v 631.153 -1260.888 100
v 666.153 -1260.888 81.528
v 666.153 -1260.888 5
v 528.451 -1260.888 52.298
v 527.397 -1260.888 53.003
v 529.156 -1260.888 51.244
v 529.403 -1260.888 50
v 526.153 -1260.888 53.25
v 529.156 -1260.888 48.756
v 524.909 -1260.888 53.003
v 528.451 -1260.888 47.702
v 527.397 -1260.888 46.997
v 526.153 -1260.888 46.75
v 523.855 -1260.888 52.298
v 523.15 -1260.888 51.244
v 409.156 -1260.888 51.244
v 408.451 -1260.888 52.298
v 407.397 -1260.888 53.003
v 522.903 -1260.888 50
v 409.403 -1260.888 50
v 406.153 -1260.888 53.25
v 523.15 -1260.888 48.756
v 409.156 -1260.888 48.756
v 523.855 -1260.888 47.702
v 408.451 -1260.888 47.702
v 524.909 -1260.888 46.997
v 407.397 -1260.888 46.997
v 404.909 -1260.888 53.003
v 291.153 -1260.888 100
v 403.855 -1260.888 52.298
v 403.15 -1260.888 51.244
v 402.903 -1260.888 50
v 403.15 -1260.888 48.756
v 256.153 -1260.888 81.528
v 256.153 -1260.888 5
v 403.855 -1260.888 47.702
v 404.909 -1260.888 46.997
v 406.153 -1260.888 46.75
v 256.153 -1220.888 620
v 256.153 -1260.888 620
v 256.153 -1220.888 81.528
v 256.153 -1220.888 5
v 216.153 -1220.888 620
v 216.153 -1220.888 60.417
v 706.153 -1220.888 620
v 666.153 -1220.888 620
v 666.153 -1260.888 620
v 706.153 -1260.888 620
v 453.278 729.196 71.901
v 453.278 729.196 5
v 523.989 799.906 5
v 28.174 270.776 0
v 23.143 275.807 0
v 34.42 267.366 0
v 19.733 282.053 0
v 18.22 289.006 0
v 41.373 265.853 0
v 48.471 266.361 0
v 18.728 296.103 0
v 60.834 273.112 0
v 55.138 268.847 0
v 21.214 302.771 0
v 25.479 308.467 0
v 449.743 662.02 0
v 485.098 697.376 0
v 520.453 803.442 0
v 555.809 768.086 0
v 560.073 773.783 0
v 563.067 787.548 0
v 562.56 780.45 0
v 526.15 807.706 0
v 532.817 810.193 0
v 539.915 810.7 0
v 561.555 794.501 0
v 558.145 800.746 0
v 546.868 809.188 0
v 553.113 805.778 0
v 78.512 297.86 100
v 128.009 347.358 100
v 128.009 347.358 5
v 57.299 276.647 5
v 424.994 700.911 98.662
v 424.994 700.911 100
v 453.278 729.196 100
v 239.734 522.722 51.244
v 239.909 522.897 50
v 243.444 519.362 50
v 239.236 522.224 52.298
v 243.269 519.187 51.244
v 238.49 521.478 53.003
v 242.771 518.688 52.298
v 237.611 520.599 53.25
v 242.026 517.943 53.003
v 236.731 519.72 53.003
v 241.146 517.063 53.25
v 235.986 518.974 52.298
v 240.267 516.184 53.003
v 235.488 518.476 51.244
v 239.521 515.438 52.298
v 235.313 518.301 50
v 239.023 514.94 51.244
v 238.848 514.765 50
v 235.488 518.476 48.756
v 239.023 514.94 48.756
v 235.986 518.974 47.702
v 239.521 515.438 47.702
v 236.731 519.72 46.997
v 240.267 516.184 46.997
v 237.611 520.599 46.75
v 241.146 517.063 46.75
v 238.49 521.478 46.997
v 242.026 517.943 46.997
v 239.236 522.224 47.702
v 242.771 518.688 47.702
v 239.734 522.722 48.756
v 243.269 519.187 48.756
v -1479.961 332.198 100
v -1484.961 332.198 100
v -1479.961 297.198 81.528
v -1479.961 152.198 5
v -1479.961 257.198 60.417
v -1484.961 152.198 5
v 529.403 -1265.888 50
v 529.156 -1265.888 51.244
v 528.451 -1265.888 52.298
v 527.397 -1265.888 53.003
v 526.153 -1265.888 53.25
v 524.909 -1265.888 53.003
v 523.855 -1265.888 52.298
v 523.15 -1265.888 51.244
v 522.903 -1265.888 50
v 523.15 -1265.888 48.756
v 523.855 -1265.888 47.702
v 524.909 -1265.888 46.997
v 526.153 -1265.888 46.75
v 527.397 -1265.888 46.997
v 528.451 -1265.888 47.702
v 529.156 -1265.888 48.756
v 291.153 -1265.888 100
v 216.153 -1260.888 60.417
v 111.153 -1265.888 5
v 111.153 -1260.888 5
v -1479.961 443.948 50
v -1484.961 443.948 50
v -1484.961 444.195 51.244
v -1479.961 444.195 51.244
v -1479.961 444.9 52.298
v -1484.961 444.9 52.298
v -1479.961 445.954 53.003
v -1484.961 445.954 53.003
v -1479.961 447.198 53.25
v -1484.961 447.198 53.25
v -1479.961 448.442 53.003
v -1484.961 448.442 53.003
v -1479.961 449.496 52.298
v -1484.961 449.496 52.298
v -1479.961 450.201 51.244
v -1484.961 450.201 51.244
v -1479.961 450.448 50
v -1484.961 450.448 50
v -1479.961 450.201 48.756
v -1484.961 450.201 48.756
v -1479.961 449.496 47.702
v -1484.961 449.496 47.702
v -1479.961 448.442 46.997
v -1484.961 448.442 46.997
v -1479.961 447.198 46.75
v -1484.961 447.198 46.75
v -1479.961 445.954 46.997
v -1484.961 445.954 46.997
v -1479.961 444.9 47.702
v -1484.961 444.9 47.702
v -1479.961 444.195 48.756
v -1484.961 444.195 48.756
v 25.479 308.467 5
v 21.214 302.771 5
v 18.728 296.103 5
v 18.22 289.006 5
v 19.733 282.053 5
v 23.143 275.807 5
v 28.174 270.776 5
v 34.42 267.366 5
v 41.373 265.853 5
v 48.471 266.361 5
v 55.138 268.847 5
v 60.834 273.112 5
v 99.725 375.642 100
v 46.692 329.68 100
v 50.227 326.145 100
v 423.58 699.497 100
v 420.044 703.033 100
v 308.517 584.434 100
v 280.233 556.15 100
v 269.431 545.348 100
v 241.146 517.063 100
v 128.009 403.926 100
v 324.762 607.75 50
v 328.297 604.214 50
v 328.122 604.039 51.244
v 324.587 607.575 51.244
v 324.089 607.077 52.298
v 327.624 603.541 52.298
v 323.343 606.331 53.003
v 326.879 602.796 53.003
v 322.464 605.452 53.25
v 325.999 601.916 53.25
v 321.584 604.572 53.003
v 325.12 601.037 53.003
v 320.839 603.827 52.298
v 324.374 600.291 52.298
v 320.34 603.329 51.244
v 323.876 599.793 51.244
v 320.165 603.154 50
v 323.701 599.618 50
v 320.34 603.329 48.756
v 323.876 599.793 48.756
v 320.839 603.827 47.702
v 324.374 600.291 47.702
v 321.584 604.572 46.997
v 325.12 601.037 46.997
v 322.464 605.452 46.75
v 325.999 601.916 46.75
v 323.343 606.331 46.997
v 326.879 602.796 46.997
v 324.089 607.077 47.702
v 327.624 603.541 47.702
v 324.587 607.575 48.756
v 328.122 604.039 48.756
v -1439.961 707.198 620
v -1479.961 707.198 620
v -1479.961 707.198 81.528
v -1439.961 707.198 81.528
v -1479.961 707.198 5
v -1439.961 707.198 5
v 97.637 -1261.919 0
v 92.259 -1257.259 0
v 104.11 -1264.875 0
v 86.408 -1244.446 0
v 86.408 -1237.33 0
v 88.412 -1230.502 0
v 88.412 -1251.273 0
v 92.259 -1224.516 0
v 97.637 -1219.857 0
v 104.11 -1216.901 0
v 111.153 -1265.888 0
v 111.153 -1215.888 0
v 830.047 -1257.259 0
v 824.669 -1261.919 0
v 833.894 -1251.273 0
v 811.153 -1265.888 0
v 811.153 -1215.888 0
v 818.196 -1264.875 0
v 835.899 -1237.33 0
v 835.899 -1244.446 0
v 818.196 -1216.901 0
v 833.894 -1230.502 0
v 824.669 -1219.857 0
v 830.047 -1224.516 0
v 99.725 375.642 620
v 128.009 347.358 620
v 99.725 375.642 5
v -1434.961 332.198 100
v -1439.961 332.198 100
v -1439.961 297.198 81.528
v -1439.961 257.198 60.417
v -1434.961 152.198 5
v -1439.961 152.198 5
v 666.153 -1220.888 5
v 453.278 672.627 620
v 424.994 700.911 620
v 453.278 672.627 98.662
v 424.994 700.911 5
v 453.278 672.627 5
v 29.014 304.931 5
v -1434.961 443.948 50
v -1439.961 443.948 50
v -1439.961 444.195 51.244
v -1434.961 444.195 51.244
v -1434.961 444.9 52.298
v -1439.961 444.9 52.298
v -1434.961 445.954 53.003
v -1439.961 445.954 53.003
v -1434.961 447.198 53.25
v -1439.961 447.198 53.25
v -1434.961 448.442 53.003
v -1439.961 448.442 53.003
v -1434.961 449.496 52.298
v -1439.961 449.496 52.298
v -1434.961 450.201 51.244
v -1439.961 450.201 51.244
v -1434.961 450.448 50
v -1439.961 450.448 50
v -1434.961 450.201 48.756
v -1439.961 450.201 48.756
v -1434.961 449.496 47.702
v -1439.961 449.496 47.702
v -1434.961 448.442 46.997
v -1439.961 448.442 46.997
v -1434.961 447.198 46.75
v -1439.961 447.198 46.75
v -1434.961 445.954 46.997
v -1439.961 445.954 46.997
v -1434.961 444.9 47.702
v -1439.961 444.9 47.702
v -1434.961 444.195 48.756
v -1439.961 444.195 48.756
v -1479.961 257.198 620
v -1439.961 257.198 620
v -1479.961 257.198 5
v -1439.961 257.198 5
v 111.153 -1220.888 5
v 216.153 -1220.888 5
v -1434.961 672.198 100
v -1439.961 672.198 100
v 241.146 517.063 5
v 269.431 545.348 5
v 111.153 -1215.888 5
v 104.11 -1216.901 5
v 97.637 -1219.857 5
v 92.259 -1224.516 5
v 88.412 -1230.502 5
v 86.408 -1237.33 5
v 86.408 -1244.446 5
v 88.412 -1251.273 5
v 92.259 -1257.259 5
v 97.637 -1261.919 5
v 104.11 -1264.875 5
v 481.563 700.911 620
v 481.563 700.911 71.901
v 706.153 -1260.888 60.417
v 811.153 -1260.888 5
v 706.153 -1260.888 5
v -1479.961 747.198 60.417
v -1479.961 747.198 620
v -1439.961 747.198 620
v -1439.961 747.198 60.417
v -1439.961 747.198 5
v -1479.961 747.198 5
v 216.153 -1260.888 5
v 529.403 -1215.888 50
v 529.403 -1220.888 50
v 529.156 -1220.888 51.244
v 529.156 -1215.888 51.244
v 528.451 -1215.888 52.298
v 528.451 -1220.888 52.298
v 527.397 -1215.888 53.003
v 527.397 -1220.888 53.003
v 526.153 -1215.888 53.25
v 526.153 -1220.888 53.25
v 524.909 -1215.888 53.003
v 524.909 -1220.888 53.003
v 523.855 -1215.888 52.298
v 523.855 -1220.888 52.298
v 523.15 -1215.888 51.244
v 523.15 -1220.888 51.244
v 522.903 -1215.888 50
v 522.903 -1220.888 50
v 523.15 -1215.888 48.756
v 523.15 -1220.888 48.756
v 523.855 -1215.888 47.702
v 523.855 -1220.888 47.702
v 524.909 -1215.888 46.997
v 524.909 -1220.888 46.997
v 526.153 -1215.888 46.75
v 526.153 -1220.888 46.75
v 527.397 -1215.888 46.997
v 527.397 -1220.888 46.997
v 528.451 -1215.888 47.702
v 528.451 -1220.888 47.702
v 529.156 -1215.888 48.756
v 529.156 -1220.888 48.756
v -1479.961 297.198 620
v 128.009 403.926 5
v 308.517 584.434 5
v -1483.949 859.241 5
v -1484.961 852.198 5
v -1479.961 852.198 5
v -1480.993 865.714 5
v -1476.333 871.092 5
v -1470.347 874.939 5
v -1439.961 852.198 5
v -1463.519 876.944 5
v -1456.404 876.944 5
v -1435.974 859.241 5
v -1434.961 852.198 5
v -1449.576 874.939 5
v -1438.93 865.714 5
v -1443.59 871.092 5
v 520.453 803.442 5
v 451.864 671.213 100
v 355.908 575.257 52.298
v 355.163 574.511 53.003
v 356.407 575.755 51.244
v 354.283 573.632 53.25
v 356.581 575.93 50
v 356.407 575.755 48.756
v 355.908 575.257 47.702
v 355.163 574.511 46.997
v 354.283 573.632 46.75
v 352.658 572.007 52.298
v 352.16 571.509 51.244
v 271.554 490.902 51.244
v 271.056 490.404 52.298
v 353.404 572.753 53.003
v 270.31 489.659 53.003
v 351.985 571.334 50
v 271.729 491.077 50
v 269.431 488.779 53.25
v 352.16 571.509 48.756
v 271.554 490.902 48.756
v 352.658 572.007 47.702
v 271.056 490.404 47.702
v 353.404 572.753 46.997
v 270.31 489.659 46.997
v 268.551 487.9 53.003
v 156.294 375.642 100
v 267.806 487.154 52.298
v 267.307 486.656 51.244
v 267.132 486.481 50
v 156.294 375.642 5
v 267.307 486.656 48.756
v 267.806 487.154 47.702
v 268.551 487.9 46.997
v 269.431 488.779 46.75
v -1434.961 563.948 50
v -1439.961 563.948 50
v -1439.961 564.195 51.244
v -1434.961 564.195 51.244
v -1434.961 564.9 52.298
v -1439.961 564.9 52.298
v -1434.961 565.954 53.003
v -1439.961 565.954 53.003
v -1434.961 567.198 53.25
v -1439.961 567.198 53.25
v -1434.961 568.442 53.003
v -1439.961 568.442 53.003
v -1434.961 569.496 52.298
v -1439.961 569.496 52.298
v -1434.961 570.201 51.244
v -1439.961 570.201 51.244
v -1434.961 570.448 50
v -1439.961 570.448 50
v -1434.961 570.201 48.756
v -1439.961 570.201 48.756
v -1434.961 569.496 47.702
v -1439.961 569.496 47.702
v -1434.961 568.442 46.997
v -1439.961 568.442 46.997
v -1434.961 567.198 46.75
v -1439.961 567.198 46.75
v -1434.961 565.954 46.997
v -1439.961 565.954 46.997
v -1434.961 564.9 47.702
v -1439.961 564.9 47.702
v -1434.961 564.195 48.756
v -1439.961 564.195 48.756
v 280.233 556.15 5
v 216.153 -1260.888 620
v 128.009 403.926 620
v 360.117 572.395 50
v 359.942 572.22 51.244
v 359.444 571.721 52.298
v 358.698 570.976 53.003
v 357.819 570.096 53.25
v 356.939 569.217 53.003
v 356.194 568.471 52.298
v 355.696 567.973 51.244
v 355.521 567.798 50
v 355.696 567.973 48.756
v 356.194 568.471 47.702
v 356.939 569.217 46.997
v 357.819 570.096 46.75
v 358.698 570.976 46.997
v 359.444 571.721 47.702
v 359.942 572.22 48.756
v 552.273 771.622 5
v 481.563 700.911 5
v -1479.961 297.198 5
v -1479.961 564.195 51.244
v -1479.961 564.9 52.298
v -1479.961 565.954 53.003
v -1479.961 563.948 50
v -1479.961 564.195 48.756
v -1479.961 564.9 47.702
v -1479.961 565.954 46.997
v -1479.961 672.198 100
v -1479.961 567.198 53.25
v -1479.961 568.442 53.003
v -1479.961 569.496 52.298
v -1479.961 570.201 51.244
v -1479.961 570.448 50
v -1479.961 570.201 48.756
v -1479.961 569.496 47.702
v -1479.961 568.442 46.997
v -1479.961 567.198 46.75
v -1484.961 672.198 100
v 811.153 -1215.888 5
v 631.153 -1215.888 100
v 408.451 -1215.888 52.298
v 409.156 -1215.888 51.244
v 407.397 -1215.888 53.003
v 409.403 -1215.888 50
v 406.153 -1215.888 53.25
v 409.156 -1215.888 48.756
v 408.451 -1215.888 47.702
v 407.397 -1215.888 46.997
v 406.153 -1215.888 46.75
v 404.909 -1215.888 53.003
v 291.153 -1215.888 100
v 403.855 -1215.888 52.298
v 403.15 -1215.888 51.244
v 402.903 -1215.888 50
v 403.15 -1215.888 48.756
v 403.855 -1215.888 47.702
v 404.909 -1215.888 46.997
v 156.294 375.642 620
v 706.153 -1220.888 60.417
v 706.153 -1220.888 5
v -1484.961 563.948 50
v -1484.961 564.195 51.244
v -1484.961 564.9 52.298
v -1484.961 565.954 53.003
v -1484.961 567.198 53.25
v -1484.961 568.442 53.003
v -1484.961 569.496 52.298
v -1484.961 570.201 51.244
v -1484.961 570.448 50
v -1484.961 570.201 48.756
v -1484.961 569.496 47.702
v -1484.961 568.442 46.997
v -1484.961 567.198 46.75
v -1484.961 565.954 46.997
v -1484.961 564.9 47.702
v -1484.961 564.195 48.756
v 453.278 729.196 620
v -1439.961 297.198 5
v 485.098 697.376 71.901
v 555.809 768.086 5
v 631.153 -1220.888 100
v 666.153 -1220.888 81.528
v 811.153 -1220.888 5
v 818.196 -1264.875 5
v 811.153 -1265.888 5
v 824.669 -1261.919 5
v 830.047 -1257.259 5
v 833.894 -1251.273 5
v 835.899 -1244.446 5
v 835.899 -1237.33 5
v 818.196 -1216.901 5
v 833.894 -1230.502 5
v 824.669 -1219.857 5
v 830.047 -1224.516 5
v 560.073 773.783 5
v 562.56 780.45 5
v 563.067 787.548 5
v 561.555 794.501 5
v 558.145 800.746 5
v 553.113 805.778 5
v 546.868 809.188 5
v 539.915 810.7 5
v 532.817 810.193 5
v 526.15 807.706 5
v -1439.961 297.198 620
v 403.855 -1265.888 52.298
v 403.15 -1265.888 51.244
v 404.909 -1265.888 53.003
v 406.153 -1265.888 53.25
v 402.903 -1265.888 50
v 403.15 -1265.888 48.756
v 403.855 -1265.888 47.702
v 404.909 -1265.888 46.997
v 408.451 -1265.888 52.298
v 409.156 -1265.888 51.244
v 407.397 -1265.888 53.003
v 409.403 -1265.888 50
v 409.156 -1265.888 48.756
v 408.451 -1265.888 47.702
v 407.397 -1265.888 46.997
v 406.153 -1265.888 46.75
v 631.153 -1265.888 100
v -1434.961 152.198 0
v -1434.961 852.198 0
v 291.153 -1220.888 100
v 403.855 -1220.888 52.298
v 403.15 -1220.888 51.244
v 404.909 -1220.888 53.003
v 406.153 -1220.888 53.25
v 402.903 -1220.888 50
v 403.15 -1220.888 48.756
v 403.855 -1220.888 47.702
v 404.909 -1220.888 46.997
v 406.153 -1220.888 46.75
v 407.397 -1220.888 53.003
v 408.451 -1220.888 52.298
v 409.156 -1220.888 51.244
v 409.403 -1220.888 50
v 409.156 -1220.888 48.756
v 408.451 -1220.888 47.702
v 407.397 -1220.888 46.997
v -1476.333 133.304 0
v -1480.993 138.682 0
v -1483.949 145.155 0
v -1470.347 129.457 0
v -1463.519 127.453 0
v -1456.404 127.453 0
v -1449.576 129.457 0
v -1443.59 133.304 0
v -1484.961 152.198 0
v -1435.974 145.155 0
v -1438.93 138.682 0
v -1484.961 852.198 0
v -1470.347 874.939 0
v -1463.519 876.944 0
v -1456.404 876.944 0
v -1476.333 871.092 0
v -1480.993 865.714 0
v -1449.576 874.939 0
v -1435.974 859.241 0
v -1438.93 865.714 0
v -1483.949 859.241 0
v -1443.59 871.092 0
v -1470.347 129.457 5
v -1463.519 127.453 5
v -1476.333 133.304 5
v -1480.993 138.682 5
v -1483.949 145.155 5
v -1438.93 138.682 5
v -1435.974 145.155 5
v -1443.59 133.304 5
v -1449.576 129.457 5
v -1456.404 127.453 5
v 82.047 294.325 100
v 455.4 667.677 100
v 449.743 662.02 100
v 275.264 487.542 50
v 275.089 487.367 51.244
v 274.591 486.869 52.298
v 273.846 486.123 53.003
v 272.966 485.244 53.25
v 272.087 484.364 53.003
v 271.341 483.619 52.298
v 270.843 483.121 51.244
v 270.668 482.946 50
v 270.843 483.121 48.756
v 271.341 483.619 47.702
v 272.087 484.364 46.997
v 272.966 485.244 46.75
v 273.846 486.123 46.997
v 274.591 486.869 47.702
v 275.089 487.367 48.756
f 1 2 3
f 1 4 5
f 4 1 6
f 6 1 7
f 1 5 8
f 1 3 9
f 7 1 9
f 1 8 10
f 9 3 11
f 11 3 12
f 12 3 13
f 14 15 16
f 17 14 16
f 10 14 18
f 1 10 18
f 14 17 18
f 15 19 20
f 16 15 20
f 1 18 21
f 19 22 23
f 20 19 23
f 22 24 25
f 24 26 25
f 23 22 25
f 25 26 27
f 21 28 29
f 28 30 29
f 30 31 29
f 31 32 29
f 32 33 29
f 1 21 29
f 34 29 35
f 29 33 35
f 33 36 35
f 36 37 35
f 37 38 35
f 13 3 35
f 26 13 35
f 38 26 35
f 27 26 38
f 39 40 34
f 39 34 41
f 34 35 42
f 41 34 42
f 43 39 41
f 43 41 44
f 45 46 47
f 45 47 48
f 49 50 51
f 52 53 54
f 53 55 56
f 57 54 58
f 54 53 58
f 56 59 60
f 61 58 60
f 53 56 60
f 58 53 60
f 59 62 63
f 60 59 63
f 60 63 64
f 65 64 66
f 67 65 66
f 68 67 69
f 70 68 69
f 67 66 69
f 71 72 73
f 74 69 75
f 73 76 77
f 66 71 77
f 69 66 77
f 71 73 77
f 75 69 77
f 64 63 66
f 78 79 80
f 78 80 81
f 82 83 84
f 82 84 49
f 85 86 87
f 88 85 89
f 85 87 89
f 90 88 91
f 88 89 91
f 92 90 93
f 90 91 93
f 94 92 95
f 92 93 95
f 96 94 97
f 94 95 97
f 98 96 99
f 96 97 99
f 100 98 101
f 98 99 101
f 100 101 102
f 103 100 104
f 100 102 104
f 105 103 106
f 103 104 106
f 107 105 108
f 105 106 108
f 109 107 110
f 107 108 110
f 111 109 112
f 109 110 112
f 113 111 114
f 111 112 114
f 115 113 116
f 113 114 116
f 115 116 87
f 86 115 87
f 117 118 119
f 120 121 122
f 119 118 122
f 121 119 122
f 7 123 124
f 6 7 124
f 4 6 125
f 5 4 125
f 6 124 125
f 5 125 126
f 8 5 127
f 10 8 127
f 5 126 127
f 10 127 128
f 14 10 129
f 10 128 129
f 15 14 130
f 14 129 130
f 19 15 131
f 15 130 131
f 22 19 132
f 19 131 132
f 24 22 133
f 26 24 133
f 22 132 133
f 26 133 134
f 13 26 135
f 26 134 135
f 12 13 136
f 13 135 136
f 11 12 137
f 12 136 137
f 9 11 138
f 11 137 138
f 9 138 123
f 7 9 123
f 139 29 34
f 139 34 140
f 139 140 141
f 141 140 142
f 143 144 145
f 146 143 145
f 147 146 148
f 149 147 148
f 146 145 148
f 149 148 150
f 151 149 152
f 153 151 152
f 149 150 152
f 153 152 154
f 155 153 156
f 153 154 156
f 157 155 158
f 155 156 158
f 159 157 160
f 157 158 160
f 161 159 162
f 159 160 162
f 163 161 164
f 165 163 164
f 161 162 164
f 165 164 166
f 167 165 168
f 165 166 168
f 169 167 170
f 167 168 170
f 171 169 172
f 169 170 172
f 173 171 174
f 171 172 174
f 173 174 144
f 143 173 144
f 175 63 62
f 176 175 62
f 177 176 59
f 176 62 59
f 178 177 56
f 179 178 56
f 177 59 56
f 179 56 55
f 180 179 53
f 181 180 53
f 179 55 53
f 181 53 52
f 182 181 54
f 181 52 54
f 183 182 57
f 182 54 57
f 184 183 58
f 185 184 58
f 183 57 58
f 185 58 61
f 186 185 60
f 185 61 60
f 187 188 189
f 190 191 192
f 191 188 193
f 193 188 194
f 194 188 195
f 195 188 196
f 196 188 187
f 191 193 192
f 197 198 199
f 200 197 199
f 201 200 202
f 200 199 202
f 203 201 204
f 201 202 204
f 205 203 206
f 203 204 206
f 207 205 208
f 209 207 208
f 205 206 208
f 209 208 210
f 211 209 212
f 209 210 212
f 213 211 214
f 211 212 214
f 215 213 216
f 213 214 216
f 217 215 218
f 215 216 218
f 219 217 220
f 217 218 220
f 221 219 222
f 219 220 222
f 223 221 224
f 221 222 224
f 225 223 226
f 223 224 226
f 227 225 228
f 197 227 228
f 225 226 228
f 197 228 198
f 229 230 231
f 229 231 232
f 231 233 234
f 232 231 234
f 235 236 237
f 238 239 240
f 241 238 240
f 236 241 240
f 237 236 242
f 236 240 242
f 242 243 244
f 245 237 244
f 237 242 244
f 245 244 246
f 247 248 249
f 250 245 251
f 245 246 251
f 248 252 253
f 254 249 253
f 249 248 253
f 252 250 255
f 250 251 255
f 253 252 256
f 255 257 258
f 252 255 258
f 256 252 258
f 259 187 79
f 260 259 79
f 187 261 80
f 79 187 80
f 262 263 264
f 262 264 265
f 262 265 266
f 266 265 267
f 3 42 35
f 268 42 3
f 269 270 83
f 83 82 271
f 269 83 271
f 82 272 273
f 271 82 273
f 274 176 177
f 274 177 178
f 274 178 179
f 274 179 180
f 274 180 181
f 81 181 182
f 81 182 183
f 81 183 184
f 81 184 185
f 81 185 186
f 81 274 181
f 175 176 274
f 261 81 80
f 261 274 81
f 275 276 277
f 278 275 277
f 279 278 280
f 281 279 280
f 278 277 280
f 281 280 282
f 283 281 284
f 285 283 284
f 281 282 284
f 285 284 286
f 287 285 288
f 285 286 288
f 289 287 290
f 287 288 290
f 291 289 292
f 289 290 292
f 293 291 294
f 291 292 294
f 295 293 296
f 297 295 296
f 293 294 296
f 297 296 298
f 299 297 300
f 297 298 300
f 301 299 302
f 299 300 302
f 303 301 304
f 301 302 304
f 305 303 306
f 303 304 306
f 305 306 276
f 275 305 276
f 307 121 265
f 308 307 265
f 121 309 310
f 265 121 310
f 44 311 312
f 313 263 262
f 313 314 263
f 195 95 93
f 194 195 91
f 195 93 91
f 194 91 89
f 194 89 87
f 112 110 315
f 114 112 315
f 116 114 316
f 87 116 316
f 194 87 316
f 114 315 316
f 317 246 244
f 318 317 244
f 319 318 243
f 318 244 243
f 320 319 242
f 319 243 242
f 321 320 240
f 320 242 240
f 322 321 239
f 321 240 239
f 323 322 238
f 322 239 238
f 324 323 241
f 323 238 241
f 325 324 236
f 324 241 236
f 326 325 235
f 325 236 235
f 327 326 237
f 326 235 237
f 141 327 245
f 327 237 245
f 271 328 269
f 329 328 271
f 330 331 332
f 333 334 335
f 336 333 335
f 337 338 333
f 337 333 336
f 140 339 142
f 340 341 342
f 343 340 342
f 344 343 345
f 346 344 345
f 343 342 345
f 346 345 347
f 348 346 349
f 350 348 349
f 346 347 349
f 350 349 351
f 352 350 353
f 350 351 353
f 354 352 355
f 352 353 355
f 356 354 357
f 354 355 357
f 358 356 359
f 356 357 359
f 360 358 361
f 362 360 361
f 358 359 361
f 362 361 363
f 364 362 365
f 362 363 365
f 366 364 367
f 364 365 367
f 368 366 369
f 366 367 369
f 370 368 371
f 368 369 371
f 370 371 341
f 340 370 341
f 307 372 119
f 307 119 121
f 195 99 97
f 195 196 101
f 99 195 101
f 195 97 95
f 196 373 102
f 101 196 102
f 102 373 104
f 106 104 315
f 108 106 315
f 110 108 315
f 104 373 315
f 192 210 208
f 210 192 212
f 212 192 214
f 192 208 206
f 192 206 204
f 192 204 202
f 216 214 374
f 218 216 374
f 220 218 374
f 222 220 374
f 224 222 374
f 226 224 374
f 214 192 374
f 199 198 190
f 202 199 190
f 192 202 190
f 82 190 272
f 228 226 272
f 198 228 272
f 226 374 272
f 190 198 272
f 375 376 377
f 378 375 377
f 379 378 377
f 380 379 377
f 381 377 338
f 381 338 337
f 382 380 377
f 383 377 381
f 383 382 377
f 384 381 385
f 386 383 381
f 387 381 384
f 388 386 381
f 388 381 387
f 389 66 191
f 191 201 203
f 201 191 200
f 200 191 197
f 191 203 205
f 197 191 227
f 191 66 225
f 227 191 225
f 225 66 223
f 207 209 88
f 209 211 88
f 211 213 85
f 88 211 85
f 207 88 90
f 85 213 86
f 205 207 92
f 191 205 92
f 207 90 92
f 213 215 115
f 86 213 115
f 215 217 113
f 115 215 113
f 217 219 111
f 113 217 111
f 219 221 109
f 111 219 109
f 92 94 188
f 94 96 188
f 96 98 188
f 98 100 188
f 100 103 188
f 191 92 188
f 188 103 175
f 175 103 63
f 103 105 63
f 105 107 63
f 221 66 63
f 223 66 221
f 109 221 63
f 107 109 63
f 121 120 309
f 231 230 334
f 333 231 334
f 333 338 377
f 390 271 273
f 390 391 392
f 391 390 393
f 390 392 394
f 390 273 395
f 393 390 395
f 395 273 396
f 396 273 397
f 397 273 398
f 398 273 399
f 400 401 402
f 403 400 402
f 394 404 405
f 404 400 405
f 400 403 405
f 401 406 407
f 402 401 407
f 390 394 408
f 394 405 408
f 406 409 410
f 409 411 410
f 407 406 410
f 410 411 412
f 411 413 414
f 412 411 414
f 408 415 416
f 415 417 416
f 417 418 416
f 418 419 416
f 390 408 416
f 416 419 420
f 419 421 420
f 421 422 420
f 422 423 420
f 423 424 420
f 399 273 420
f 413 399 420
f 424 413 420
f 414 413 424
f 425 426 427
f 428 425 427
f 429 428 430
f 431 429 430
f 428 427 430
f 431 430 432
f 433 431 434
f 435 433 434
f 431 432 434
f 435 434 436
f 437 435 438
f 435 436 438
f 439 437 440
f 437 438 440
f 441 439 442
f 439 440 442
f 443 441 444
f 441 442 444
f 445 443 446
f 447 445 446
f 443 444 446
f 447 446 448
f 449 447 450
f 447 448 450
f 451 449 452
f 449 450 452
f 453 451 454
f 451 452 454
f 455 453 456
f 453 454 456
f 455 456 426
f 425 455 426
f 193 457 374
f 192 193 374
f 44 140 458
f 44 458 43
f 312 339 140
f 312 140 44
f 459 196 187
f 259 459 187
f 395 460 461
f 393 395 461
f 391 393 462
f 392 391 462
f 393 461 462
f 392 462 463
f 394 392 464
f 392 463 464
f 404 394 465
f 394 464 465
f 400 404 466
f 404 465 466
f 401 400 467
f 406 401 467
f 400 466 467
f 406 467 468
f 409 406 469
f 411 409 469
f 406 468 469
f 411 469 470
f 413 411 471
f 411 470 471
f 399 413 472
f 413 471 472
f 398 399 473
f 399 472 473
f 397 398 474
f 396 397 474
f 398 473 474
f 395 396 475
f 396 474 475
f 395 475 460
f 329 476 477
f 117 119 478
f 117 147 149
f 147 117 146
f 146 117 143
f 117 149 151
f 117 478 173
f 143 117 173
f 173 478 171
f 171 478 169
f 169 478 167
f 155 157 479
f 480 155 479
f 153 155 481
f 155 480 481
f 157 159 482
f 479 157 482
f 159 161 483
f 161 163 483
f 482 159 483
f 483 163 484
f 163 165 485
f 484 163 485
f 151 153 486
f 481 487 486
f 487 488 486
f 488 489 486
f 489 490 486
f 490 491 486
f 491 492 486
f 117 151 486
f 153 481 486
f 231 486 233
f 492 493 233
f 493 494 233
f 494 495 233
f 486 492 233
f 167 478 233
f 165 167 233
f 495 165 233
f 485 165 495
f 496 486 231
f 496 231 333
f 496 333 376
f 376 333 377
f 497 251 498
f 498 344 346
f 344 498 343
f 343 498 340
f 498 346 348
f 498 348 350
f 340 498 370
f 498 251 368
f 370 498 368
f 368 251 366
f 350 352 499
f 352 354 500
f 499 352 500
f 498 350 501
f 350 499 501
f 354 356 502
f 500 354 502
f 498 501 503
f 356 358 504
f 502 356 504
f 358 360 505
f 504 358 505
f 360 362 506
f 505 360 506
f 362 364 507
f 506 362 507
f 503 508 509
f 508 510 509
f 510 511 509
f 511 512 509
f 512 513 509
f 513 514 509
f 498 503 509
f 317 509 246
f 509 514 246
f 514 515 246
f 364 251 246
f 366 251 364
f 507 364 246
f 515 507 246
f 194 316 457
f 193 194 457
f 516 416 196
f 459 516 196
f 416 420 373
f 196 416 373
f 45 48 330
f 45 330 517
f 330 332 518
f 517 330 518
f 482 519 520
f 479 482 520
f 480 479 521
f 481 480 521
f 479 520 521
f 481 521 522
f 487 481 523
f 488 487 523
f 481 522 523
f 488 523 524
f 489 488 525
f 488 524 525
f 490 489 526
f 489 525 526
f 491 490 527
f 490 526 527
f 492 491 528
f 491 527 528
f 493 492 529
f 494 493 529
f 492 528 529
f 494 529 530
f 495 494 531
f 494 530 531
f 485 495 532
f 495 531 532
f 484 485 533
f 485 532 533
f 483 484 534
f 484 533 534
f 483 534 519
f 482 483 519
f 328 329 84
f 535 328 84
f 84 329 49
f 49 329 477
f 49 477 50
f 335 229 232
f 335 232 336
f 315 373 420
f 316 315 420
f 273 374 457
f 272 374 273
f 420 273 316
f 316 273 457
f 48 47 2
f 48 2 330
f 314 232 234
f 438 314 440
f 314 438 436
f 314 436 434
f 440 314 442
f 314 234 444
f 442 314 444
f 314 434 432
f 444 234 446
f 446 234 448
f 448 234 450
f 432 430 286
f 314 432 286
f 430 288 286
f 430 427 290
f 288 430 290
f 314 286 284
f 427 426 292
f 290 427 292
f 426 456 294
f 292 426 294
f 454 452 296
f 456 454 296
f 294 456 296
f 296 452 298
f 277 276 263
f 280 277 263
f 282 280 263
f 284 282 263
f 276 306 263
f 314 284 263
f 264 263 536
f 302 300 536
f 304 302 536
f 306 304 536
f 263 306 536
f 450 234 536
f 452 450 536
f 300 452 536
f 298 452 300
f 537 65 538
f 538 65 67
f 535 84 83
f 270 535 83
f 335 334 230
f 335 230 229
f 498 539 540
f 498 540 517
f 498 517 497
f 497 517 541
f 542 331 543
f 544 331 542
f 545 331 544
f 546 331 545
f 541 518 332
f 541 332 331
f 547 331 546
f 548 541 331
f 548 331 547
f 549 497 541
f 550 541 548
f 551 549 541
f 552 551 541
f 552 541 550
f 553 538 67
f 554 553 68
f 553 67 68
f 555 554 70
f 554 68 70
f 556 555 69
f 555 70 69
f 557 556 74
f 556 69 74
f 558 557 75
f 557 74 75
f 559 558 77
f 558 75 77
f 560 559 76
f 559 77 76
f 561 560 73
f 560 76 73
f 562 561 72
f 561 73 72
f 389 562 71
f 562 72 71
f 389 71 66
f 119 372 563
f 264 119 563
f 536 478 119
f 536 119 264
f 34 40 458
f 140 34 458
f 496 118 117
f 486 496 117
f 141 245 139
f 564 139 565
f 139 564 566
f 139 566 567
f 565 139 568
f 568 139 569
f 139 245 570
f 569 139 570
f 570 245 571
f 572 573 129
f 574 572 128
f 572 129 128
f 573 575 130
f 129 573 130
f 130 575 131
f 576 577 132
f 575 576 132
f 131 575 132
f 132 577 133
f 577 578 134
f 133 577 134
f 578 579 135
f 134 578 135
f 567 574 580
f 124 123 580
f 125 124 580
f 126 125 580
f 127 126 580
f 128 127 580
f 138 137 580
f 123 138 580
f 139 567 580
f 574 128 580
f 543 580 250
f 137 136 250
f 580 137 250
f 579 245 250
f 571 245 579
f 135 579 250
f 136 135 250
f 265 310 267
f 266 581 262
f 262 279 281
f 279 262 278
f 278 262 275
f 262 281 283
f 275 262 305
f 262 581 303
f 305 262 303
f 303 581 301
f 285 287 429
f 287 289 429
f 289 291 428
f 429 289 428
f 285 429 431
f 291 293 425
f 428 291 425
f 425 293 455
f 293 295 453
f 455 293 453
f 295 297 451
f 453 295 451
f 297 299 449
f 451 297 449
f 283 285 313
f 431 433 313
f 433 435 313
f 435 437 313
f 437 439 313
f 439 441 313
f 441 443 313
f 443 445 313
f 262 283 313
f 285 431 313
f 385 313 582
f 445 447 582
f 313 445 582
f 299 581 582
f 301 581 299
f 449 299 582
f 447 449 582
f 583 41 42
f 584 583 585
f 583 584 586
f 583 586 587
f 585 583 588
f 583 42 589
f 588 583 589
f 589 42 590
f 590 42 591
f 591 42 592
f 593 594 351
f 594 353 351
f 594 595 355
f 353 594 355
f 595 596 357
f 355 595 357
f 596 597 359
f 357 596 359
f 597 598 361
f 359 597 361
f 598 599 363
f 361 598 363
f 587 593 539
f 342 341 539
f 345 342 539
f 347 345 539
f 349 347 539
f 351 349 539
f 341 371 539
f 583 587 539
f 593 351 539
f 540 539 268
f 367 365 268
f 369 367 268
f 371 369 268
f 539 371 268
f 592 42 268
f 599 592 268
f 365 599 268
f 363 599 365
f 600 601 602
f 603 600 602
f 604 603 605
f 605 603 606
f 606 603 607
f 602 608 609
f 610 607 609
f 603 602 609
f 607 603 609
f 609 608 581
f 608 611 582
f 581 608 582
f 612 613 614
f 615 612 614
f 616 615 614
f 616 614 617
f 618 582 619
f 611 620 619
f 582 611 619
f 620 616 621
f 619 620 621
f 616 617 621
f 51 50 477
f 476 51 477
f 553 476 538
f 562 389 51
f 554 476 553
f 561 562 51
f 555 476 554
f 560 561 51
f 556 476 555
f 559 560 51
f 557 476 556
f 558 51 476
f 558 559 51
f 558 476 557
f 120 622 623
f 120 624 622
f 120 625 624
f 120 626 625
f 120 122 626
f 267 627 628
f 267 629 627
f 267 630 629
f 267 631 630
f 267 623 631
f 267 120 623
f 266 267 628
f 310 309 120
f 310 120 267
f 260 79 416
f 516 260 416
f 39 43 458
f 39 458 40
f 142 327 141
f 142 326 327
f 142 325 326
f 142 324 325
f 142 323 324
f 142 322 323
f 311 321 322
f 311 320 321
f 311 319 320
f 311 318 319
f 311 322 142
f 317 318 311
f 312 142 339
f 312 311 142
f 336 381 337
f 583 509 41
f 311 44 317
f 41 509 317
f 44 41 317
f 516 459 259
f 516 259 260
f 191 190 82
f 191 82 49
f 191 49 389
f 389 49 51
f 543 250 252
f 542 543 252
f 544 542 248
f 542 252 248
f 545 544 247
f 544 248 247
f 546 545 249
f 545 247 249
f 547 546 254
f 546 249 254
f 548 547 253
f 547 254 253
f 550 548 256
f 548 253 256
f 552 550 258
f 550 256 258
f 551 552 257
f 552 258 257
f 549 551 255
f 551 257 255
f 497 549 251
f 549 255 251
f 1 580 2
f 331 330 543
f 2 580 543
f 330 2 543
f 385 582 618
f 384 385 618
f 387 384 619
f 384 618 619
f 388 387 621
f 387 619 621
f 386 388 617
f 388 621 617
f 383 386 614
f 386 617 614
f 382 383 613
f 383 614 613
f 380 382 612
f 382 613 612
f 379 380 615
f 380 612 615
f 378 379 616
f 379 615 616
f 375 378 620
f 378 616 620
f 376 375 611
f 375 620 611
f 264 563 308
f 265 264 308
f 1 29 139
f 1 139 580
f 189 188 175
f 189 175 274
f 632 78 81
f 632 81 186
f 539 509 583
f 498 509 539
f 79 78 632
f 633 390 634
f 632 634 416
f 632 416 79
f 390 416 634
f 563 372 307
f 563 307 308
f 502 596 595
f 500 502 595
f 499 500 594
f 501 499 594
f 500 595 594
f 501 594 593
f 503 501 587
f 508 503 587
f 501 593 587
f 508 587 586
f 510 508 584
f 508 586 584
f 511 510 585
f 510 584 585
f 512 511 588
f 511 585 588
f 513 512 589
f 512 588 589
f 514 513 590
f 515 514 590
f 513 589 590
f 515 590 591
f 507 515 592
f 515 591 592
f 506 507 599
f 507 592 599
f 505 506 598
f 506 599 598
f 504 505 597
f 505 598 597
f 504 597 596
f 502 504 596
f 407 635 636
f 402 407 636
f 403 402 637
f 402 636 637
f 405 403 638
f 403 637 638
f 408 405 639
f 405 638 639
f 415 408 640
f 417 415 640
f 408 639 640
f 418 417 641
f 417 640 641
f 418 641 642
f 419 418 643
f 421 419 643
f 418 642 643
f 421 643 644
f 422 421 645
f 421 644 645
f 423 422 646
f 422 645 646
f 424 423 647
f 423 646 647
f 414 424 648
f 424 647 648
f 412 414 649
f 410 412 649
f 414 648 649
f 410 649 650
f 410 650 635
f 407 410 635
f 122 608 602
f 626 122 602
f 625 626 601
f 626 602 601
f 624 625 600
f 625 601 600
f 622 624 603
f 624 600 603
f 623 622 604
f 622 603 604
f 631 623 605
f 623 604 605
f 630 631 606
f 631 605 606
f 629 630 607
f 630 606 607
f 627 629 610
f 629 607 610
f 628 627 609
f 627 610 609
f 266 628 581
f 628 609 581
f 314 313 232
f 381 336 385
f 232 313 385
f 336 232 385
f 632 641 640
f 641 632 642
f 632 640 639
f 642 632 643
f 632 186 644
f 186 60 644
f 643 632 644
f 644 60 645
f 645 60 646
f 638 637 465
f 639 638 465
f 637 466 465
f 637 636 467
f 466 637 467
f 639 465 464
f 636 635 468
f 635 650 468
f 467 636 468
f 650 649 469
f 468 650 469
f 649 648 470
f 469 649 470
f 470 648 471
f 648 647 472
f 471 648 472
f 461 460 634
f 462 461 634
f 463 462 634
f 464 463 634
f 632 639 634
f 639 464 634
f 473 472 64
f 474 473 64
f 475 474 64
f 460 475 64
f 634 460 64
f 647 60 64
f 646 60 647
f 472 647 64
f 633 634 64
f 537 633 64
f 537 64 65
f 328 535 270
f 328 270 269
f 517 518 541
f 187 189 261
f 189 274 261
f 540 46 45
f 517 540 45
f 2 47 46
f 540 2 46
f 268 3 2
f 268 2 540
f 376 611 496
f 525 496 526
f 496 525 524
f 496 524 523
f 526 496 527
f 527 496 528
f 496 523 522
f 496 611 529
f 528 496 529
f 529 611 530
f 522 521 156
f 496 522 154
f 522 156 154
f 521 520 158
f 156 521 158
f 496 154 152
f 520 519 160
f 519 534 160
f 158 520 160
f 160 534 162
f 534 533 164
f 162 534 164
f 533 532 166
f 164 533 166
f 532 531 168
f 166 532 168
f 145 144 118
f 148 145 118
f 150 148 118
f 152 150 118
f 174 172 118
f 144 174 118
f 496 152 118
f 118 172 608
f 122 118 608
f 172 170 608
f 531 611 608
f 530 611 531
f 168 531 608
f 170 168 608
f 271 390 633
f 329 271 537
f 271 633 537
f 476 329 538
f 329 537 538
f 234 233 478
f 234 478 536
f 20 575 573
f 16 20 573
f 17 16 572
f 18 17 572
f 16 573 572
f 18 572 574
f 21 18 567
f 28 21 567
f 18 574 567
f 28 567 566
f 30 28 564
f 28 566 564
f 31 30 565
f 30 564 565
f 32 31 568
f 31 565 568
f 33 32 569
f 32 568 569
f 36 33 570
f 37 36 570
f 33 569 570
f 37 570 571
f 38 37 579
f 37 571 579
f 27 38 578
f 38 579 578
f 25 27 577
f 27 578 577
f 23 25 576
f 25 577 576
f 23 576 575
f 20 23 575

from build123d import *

# Parameters (mm, degrees)
F0_W           = 105
F0_H           = 40
F1_DEPTH       = 5
F0_W_2         = 40
F0_H_2         = 105
F2_DEPTH       = 620
F3_DEPTH       = 100
F4_T4_DEPTH    = 5
F4_T9_DEPTH    = 5
F4_T14_DEPTH   = 5
F4_T19_DEPTH   = 5
F4_2_T4_DEPTH  = 5
F4_2_T9_DEPTH  = 5
F4_2_T14_DEPTH = 5
F4_2_T19_DEPTH = 5
F6_T4_DEPTH    = 5
F6_T9_DEPTH    = 5
F7_SIZE2       = 94.99999
F7_SIZE        = 29.99999
F7_2_SIZE2     = 94.99999
F7_2_SIZE      = 29.99999
F10_R          = 3.25
F11_DEPTH      = 60
F12_R          = 3.25
F13_DEPTH      = 60
F14_R          = 3.25
F15_DEPTH      = 60


# Not quite as in the source:
# - a fillet or chamfer that OpenCascade refuses, or shapes differently, is made with other operations: its cross-section is extruded or revolved along the edge and cut away or added
# - two fillets or chamfers of one size are made in one step
# - a fillet or chamfer is up to 0.001 mm smaller than in the source, because OpenCascade refuses the exact size
# - a feature names something its author has since deleted; it is built from what else it names


with BuildPart() as f1:
    # F0 (on Top) → F1 (new body)
    with BuildSketch(Plane.XY):
        with BuildLine():
            ThreePointArc((811.153096903, -1265.8878414162), (836.153096903, -1240.8878414162), (811.153096903, -1215.8878414162))
            Line((811.153096903, -1215.8878414162), (811.153096903, -1220.8878414162))
            Line((811.153096903, -1220.8878414162), (811.153096903, -1260.8878414162))
            Line((811.153096903, -1260.8878414162), (811.153096903, -1265.8878414162))
        make_face()
        with Locations((758.653096903, -1240.8878414162)):
            Rectangle(F0_W, F0_H)
    extrude(amount=F1_DEPTH)



with BuildPart() as f1b:
    # F0 (on Top) → F1, piece 2 (new body)
    with BuildSketch(Plane.XY):
        with BuildLine():
            Line((111.153096903, -1220.8878414162), (111.153096903, -1215.8878414162))
            ThreePointArc((111.153096903, -1215.8878414162), (86.153096903, -1240.8878414162), (111.153096903, -1265.8878414162))
            Line((111.153096903, -1265.8878414162), (111.153096903, -1260.8878414162))
            Line((111.153096903, -1260.8878414162), (111.153096903, -1220.8878414162))
        make_face()
        with Locations((163.653096903, -1240.8878414162)):
            Rectangle(F0_W, F0_H)
    extrude(amount=F1_DEPTH)


with BuildPart() as f1c:
    # F0 (on Top) → F1, piece 3 (new body)
    with BuildSketch(Plane.XY):
        with BuildLine():
            Line((29.0142804433, 304.9314484107), (25.4787465374, 308.4669823167))
            ThreePointArc((25.4787465374, 308.4669823167), (25.4787465374, 273.1116432573), (60.8340855967, 273.1116432573))
            Line((60.8340855967, 273.1116432573), (57.2985516908, 276.6471771633))
            Line((57.2985516908, 276.6471771633), (29.0142804433, 304.9314484107))
        make_face()
        Polygon((99.724958562, 375.6421265294), (29.0142804433, 304.9314484107), (57.2985516908, 276.6471771633), (128.0092298094, 347.3578552819), align=None)
    extrude(amount=F1_DEPTH)



with BuildPart() as f1d:
    # F0 (on Top) → F1, piece 4 (new body)
    with BuildSketch(Plane.XY):
        with BuildLine():
            ThreePointArc((555.8088324273, 768.0863900879), (555.8088324273, 803.4417291473), (520.453493368, 803.4417291473))
            Line((520.453493368, 803.4417291473), (523.9890272739, 799.9061952413))
            Line((523.9890272739, 799.9061952413), (552.2732985214, 771.6219239939))
            Line((552.2732985214, 771.6219239939), (555.8088324273, 768.0863900879))
        make_face()
        Polygon((552.2732985214, 771.6219239939), (523.9890272739, 799.9061952413), (453.2783491552, 729.1955171227), (481.5626204027, 700.9112458752), align=None)
    extrude(amount=F1_DEPTH)


with BuildPart() as f1e:
    # F0 (on Top) → F1, piece 5 (new body)
    with BuildSketch(Plane.XY):
        with BuildLine():
            Line((-1479.9614127988, 152.1980424396), (-1484.9614127988, 152.1980424396))
            ThreePointArc((-1484.9614127988, 152.1980424396), (-1459.9614127988, 127.1980424396), (-1434.9614127988, 152.1980424396))
            Line((-1434.9614127988, 152.1980424396), (-1439.9614127988, 152.1980424396))
            Line((-1439.9614127988, 152.1980424396), (-1479.9614127988, 152.1980424396))
        make_face()
        Polygon((-1479.9614127988, 202.1980424396), (-1479.9614127988, 152.1980424396), (-1439.9614127988, 152.1980424396), (-1439.9614127988, 202.1980424396), (-1439.9614127988, 242.1980424396), (-1439.9614127988, 257.1980424396), (-1479.9614127988, 257.1980424396), (-1479.9614127988, 242.1980424396), align=None)
    extrude(amount=F1_DEPTH)



with BuildPart() as f1f:
    # F0 (on Top) → F1, piece 6 (new body)
    with BuildSketch(Plane.XY):
        with BuildLine():
            ThreePointArc((-1434.9614127988, 852.1980424396), (-1459.9614127988, 877.1980424396), (-1484.9614127988, 852.1980424396))
            Line((-1484.9614127988, 852.1980424396), (-1479.9614127988, 852.1980424396))
            Line((-1479.9614127988, 852.1980424396), (-1439.9614127988, 852.1980424396))
            Line((-1439.9614127988, 852.1980424396), (-1434.9614127988, 852.1980424396))
        make_face()
        with Locations((-1459.9614127988, 799.6980424396)):
            Rectangle(F0_W_2, F0_H_2)
    extrude(amount=F1_DEPTH)


with BuildPart() as f1g:
    # F0 (on Top) → F1, piece 7 (new body)
    with BuildSketch(Plane.XY):
        Polygon((331.153096903, -1220.8878414162), (256.153096903, -1220.8878414162), (256.153096903, -1260.8878414162), (331.153096903, -1260.8878414162), (421.153096903, -1260.8878414162), (511.153096903, -1260.8878414162), (591.153096903, -1260.8878414162), (666.153096903, -1260.8878414162), (666.153096903, -1220.8878414162), (591.153096903, -1220.8878414162), (511.153096903, -1220.8878414162), (421.153096903, -1220.8878414162), align=None)
    extrude(amount=F1_DEPTH)


with BuildPart() as f1h:
    # F0 (on Top) → F1, piece 8 (new body)
    with BuildSketch(Plane.XY):
        Polygon((-1439.9614127988, 707.1980424396), (-1479.9614127988, 707.1980424396), (-1479.9614127988, 542.1980424396), (-1479.9614127988, 502.1980424396), (-1479.9614127988, 297.1980424396), (-1439.9614127988, 297.1980424396), (-1439.9614127988, 502.1980424396), (-1439.9614127988, 542.1980424396), align=None)
    extrude(amount=F1_DEPTH)


with BuildPart() as f1i:
    # F0 (on Top) → F1, piece 9 (new body)
    with BuildSketch(Plane.XY):
        Polygon((241.1463147993, 517.0634827667), (128.0092298094, 403.9263977769), (156.2935010569, 375.6421265294), (269.4305860467, 488.7792115192), (297.7148572942, 517.0634827667), (304.7859251061, 524.1345505786), (333.0701963535, 552.418821826), (453.2783491552, 672.6269746277), (424.9940779078, 700.9112458752), (308.516985229, 584.4341531964), (280.2327139815, 556.149881949), (269.4305860467, 545.3477540142), align=None)
    extrude(amount=F1_DEPTH)


with BuildPart() as f1c_1:
    add(f1c.part)

    add(f1d.part)  # F2 merges F1d

    add(f1i.part)  # F2 merges F1i
    # F0 (on Top) → F2 (join)
    with BuildSketch(Plane.XY):
        Polygon((128.0092298094, 403.9263977769), (99.724958562, 375.6421265294), (128.0092298094, 347.3578552819), (156.2935010569, 375.6421265294), align=None)
        Polygon((481.5626204027, 700.9112458752), (453.2783491552, 729.1955171227), (424.9940779078, 700.9112458752), (453.2783491552, 672.6269746277), align=None)
    extrude(amount=F2_DEPTH)

    # F0 (on Top) → F3, piece 2 (join)
    with BuildSketch(Plane.XY):
        Polygon((392.9787465374, 675.9669823167), (43.156416067, 326.1446518463), (25.4787465374, 308.4669823167), (29.0142804433, 304.9314484107), (99.724958562, 375.6421265294), (128.0092298094, 403.9263977769), (241.1463147993, 517.0634827667), (269.4305860467, 545.3477540142), (280.2327139815, 556.149881949), (308.516985229, 584.4341531964), (424.9940779078, 700.9112458752), (453.2783491552, 729.1955171227), (523.9890272739, 799.9061952413), (520.453493368, 803.4417291473), (446.0117551264, 728.9999909057), (414.38747619, 697.3757119693), align=None)
        Polygon((57.2985516908, 276.6471771633), (60.8340855967, 273.1116432573), (78.5117551264, 290.789312787), (428.3340855967, 640.6116432573), (449.7428152493, 662.0203729099), (485.0981543086, 697.3757119693), (555.8088324273, 768.0863900879), (552.2732985214, 771.6219239939), (481.5626204027, 700.9112458752), (453.2783491552, 672.6269746277), (333.0701963535, 552.418821826), (304.7859251061, 524.1345505786), (297.7148572942, 517.0634827667), (269.4305860467, 488.7792115192), (156.2935010569, 375.6421265294), (128.0092298094, 347.3578552819), align=None)
    extrude(amount=F3_DEPTH)

    # F6: chamfer of 142 x 95 on 2 edges, made by hand


with BuildPart() as f1_1:
    add(f1.part)

    add(f1b.part)  # F2#2 merges F1b

    add(f1g.part)  # F2#2 merges F1g
    # F0 (on Top) → F2, piece 2 (join)
    with BuildSketch(Plane.XY):
        with Locations((686.153096903, -1240.8878414162)):
            Rectangle(F0_W_2, F0_H)
        with Locations((236.153096903, -1240.8878414162)):
            Rectangle(F0_W_2, F0_H)
    extrude(amount=F2_DEPTH)

    # F0 (on Top) → F3, piece 3 (join)
    with BuildSketch(Plane.XY):
        Polygon((811.153096903, -1215.8878414162), (111.153096903, -1215.8878414162), (111.153096903, -1220.8878414162), (216.153096903, -1220.8878414162), (256.153096903, -1220.8878414162), (331.153096903, -1220.8878414162), (421.153096903, -1220.8878414162), (511.153096903, -1220.8878414162), (591.153096903, -1220.8878414162), (666.153096903, -1220.8878414162), (706.153096903, -1220.8878414162), (811.153096903, -1220.8878414162), align=None)
        Polygon((111.153096903, -1260.8878414162), (111.153096903, -1265.8878414162), (811.153096903, -1265.8878414162), (811.153096903, -1260.8878414162), (706.153096903, -1260.8878414162), (666.153096903, -1260.8878414162), (591.153096903, -1260.8878414162), (511.153096903, -1260.8878414162), (421.153096903, -1260.8878414162), (331.153096903, -1260.8878414162), (256.153096903, -1260.8878414162), (216.153096903, -1260.8878414162), align=None)
    extrude(amount=F3_DEPTH)

    # F4: chamfer of 180 x 95 on 4 edges, made by hand


with BuildPart() as f1e_1:
    add(f1e.part)

    add(f1f.part)  # F2#3 merges F1f

    add(f1h.part)  # F2#3 merges F1h
    # F0 (on Top) → F2, piece 3 (join)
    with BuildSketch(Plane.XY):
        with Locations((-1459.9614127988, 727.1980424396)):
            Rectangle(F0_W_2, F0_H)
        with Locations((-1459.9614127988, 277.1980424396)):
            Rectangle(F0_W_2, F0_H)
    extrude(amount=F2_DEPTH)

    # F0 (on Top) → F3 (join)
    with BuildSketch(Plane.XY):
        Polygon((-1484.9614127988, 852.1980424396), (-1484.9614127988, 152.1980424396), (-1479.9614127988, 152.1980424396), (-1479.9614127988, 202.1980424396), (-1479.9614127988, 242.1980424396), (-1479.9614127988, 257.1980424396), (-1479.9614127988, 297.1980424396), (-1479.9614127988, 502.1980424396), (-1479.9614127988, 542.1980424396), (-1479.9614127988, 707.1980424396), (-1479.9614127988, 747.1980424396), (-1479.9614127988, 852.1980424396), align=None)
        Polygon((-1439.9614127988, 152.1980424396), (-1434.9614127988, 152.1980424396), (-1434.9614127988, 852.1980424396), (-1439.9614127988, 852.1980424396), (-1439.9614127988, 747.1980424396), (-1439.9614127988, 707.1980424396), (-1439.9614127988, 542.1980424396), (-1439.9614127988, 502.1980424396), (-1439.9614127988, 297.1980424396), (-1439.9614127988, 257.1980424396), (-1439.9614127988, 242.1980424396), (-1439.9614127988, 202.1980424396), align=None)
    extrude(amount=F3_DEPTH)

    # F4#2: chamfer of 180 x 95 on 4 edges, made by hand


with BuildPart() as f4_tool2:
    # F4_s3 → F4_t4 (new body)
    with BuildSketch(Plane.XZ.offset(1260.8878414162)):
        with BuildLine():
            Line((297.5206671235, 103.3606620608), (104.7855266825, 1.6393379392))
            Line((104.7855266825, 1.6393379392), (101.1855266825, 1.6393379392))
            ThreePointArc((101.1855266825, 1.6393379392), (107.553096903, 50.8196689696), (107.553096903, 100))
            Line((107.553096903, 100), (111.153096903, 103.6))
            ThreePointArc((111.153096903, 103.6), (204.3368820132, 103.6), (297.5206671235, 106.9606620608))
            Line((297.5206671235, 106.9606620608), (297.5206671235, 103.3606620608))
        make_face()
    extrude(amount=F4_T4_DEPTH)

    split(bisect_by=Plane.XY.offset(5), keep=Keep.TOP)


with BuildPart() as f1_2:
    add(f1_1.part)

    # F4_t1: cut F4_tool2
    add(f4_tool2.part, mode=Mode.SUBTRACT)


with BuildPart() as f4_tool7:
    # F4_s8 → F4_t9 (new body)
    with BuildSketch(Plane.XZ.offset(1215.8878414162)):
        with BuildLine():
            Line((297.5206671235, 103.3606620608), (104.7855266825, 1.6393379392))
            Line((104.7855266825, 1.6393379392), (101.1855266825, 1.6393379392))
            ThreePointArc((101.1855266825, 1.6393379392), (107.553096903, 50.8196689696), (107.553096903, 100))
            Line((107.553096903, 100), (111.153096903, 103.6))
            ThreePointArc((111.153096903, 103.6), (204.3368820132, 103.6), (297.5206671235, 106.9606620608))
            Line((297.5206671235, 106.9606620608), (297.5206671235, 103.3606620608))
        make_face()
    extrude(amount=F4_T9_DEPTH)

    split(bisect_by=Plane.XY.offset(5), keep=Keep.TOP)


with BuildPart() as f1_3:
    add(f1_2.part)

    # F4_t6: cut F4_tool7
    add(f4_tool7.part, mode=Mode.SUBTRACT)


with BuildPart() as f4_tool12:
    # F4_s13 → F4_t14 (new body)
    with BuildSketch(Plane.XZ.offset(1265.8878414162)):
        with BuildLine():
            Line((624.7855266825, 103.3606620608), (817.5206671235, 1.6393379392))
            Line((817.5206671235, 1.6393379392), (821.1206671235, 1.6393379392))
            ThreePointArc((821.1206671235, 1.6393379392), (814.753096903, 50.8196689696), (814.753096903, 100))
            Line((814.753096903, 100), (811.153096903, 103.6))
            ThreePointArc((811.153096903, 103.6), (717.9693117927, 103.6), (624.7855266825, 106.9606620608))
            Line((624.7855266825, 106.9606620608), (624.7855266825, 103.3606620608))
        make_face()
    extrude(amount=-F4_T14_DEPTH)

    split(bisect_by=Plane.XY.offset(5), keep=Keep.TOP)


with BuildPart() as f1_4:
    add(f1_3.part)

    # F4_t11: cut F4_tool12
    add(f4_tool12.part, mode=Mode.SUBTRACT)


with BuildPart() as f4_tool17:
    # F4_s18 → F4_t19 (new body)
    with BuildSketch(Plane.XZ.offset(1220.8878414162)):
        with BuildLine():
            Line((624.7855266825, 103.3606620608), (817.5206671235, 1.6393379392))
            Line((817.5206671235, 1.6393379392), (821.1206671235, 1.6393379392))
            ThreePointArc((821.1206671235, 1.6393379392), (814.753096903, 50.8196689696), (814.753096903, 100))
            Line((814.753096903, 100), (811.153096903, 103.6))
            ThreePointArc((811.153096903, 103.6), (717.9693117927, 103.6), (624.7855266825, 106.9606620608))
            Line((624.7855266825, 106.9606620608), (624.7855266825, 103.3606620608))
        make_face()
    extrude(amount=-F4_T19_DEPTH)

    split(bisect_by=Plane.XY.offset(5), keep=Keep.TOP)


with BuildPart() as f1_5:
    add(f1_4.part)

    # F4_t16: cut F4_tool17
    add(f4_tool17.part, mode=Mode.SUBTRACT)

    # F9: union 

    # F10 (on face) → F11 (cut)
    with BuildSketch(Plane.XZ.offset(1265.8878414162)):
        with Locations((406.153096903, 50)):
            Circle(F10_R)
        with Locations((526.153096903, 50)):
            Circle(F10_R)
    extrude(amount=-F11_DEPTH, mode=Mode.SUBTRACT)


with BuildPart() as f4_2_tool2:
    # F4_2_s3 → F4_2_t4 (new body)
    with BuildSketch(Plane.YZ.offset(-1484.9614127988)):
        with BuildLine():
            Line((338.5656126601, 103.3606620608), (145.8304722191, 1.6393379392))
            Line((145.8304722191, 1.6393379392), (142.2304722191, 1.6393379392))
            ThreePointArc((142.2304722191, 1.6393379392), (148.5980424396, 50.8196689696), (148.5980424396, 100))
            Line((148.5980424396, 100), (152.1980424396, 103.6))
            ThreePointArc((152.1980424396, 103.6), (245.3818275499, 103.6), (338.5656126601, 106.9606620608))
            Line((338.5656126601, 106.9606620608), (338.5656126601, 103.3606620608))
        make_face()
    extrude(amount=F4_2_T4_DEPTH)

    split(bisect_by=Plane.XY.offset(5), keep=Keep.TOP)


with BuildPart() as f1e_2:
    add(f1e_1.part)

    # F4_2_t1: cut F4_2_tool2
    add(f4_2_tool2.part, mode=Mode.SUBTRACT)


with BuildPart() as f4_2_tool7:
    # F4_2_s8 → F4_2_t9 (new body)
    with BuildSketch(Plane.YZ.offset(-1479.9614127988)):
        with BuildLine():
            Line((665.8304722191, 103.3606620608), (858.5656126601, 1.6393379392))
            Line((858.5656126601, 1.6393379392), (862.1656126601, 1.6393379392))
            ThreePointArc((862.1656126601, 1.6393379392), (855.7980424396, 50.8196689696), (855.7980424396, 100))
            Line((855.7980424396, 100), (852.1980424396, 103.6))
            ThreePointArc((852.1980424396, 103.6), (759.0142573294, 103.6), (665.8304722191, 106.9606620608))
            Line((665.8304722191, 106.9606620608), (665.8304722191, 103.3606620608))
        make_face()
    extrude(amount=-F4_2_T9_DEPTH)

    split(bisect_by=Plane.XY.offset(5), keep=Keep.TOP)


with BuildPart() as f1e_3:
    add(f1e_2.part)

    # F4_2_t6: cut F4_2_tool7
    add(f4_2_tool7.part, mode=Mode.SUBTRACT)


with BuildPart() as f4_2_tool12:
    # F4_2_s13 → F4_2_t14 (new body)
    with BuildSketch(Plane.YZ.offset(-1439.9614127988)):
        with BuildLine():
            Line((338.5656126601, 103.3606620608), (145.8304722191, 1.6393379392))
            Line((145.8304722191, 1.6393379392), (142.2304722191, 1.6393379392))
            ThreePointArc((142.2304722191, 1.6393379392), (148.5980424396, 50.8196689696), (148.5980424396, 100))
            Line((148.5980424396, 100), (152.1980424396, 103.6))
            ThreePointArc((152.1980424396, 103.6), (245.3818275499, 103.6), (338.5656126601, 106.9606620608))
            Line((338.5656126601, 106.9606620608), (338.5656126601, 103.3606620608))
        make_face()
    extrude(amount=F4_2_T14_DEPTH)

    split(bisect_by=Plane.XY.offset(5), keep=Keep.TOP)


with BuildPart() as f1e_4:
    add(f1e_3.part)

    # F4_2_t11: cut F4_2_tool12
    add(f4_2_tool12.part, mode=Mode.SUBTRACT)


with BuildPart() as f4_2_tool17:
    # F4_2_s18 → F4_2_t19 (new body)
    with BuildSketch(Plane.YZ.offset(-1434.9614127988)):
        with BuildLine():
            Line((665.8304722191, 103.3606620608), (858.5656126601, 1.6393379392))
            Line((858.5656126601, 1.6393379392), (862.1656126601, 1.6393379392))
            ThreePointArc((862.1656126601, 1.6393379392), (855.7980424396, 50.8196689696), (855.7980424396, 100))
            Line((855.7980424396, 100), (852.1980424396, 103.6))
            ThreePointArc((852.1980424396, 103.6), (759.0142573294, 103.6), (665.8304722191, 106.9606620608))
            Line((665.8304722191, 106.9606620608), (665.8304722191, 103.3606620608))
        make_face()
    extrude(amount=-F4_2_T19_DEPTH)

    split(bisect_by=Plane.XY.offset(5), keep=Keep.TOP)


with BuildPart() as f1e_5:
    add(f1e_4.part)

    # F4_2_t16: cut F4_2_tool17
    add(f4_2_tool17.part, mode=Mode.SUBTRACT)

    # F8: union 

    # F14 (on face) → F15 (cut)
    with BuildSketch(Plane(origin=(-1484.9614127988, 0, 0), x_dir=(0, -1, 0), z_dir=(-1, 0, 0))):
        with Locations((-567.1980424396, 50)):
            Circle(F14_R)
        with Locations((-447.1980424396, 50)):
            Circle(F14_R)
    extrude(amount=-F15_DEPTH, mode=Mode.SUBTRACT)


with BuildPart() as f6_tool2:
    # F6_s3 → F6_t4 (new body)
    with BuildSketch(Plane(origin=(-106.1387788303, 106.1387788303, 0), x_dir=(0, 0, 1), z_dir=(-0.7071067812, 0.7071067812, 0))):
        with BuildLine():
            Line((103.1583651049, 789.4143647378), (1.8416348951, 940.8562141041))
            Line((1.8416348951, 940.8562141041), (1.8416348951, 943.6962141041))
            ThreePointArc((1.8416348951, 943.6962141041), (50.9208174475, 938.975289421), (100, 938.975289421))
            Line((100, 938.975289421), (102.84, 936.135289421))
            ThreePointArc((102.84, 936.135289421), (102.84, 862.7748270794), (105.9983651049, 789.4143647378))
            Line((105.9983651049, 789.4143647378), (103.1583651049, 789.4143647378))
        make_face()
    extrude(amount=F6_T4_DEPTH)

    split(bisect_by=Plane.XY.offset(5), keep=Keep.TOP)


with BuildPart() as f1c_2:
    add(f1c_1.part)

    # F6_t1: cut F6_tool2
    add(f6_tool2.part, mode=Mode.SUBTRACT)


with BuildPart() as f6_tool7:
    # F6_s8 → F6_t9 (new body)
    with BuildSketch(Plane(origin=(-137.9585839837, 137.9585839837, 0), x_dir=(0, 0, 1), z_dir=(-0.7071067812, 0.7071067812, 0))):
        with BuildLine():
            Line((103.1583651049, 789.4143647378), (1.8416348951, 940.8562141041))
            Line((1.8416348951, 940.8562141041), (1.8416348951, 943.6962141041))
            ThreePointArc((1.8416348951, 943.6962141041), (50.9208174475, 938.975289421), (100, 938.975289421))
            Line((100, 938.975289421), (102.84, 936.135289421))
            ThreePointArc((102.84, 936.135289421), (102.84, 862.7748270794), (105.9983651049, 789.4143647378))
            Line((105.9983651049, 789.4143647378), (103.1583651049, 789.4143647378))
        make_face()
    extrude(amount=F6_T9_DEPTH)

    split(bisect_by=Plane.XY.offset(5), keep=Keep.TOP)


with BuildPart() as f1c_3:
    add(f1c_2.part)

    # F6_t6: cut F6_tool7
    add(f6_tool7.part, mode=Mode.SUBTRACT)

    # F7 (size 30 and 95 in the source; OpenCascade refuses exactly that, so slightly less here)
    f7_edges = [f1c_3.edges().sort_by_distance(p)[0] for p in [
        (59.066319, 274.87941, 100),
    ]]
    f7_side = f1c_3.faces().sort_by_distance((256.349111, 472.162202, 100))[0]
    chamfer(f7_edges, length=F7_SIZE, length2=F7_SIZE2, reference=f7_side)

    # F7#2 (size 30 and 95 in the source; OpenCascade refuses exactly that, so slightly less here)
    f7_2_edges = [f1c_3.edges().sort_by_distance(p)[0] for p in [
        (27.246513, 306.699215, 100),
    ]]
    f7_2_side = f1c_3.faces().sort_by_distance((224.529305, 503.982007, 100))[0]
    chamfer(f7_2_edges, length=F7_2_SIZE, length2=F7_2_SIZE2, reference=f7_2_side)

    # F12 (on face) → F13 (cut)
    with BuildSketch(Plane(origin=(-106.1387788303, 106.1387788303, 0), x_dir=(0.7071067812, 0.7071067812, 0), z_dir=(0.7071067812, -0.7071067812, 0))):
        with Locations((536.135289421, 50)):
            Circle(F12_R)
        with Locations((656.135289421, 50)):
            Circle(F12_R)
    extrude(amount=-F13_DEPTH, mode=Mode.SUBTRACT)


solid = Compound([f1_5.part, f1e_5.part, f1c_3.part])
